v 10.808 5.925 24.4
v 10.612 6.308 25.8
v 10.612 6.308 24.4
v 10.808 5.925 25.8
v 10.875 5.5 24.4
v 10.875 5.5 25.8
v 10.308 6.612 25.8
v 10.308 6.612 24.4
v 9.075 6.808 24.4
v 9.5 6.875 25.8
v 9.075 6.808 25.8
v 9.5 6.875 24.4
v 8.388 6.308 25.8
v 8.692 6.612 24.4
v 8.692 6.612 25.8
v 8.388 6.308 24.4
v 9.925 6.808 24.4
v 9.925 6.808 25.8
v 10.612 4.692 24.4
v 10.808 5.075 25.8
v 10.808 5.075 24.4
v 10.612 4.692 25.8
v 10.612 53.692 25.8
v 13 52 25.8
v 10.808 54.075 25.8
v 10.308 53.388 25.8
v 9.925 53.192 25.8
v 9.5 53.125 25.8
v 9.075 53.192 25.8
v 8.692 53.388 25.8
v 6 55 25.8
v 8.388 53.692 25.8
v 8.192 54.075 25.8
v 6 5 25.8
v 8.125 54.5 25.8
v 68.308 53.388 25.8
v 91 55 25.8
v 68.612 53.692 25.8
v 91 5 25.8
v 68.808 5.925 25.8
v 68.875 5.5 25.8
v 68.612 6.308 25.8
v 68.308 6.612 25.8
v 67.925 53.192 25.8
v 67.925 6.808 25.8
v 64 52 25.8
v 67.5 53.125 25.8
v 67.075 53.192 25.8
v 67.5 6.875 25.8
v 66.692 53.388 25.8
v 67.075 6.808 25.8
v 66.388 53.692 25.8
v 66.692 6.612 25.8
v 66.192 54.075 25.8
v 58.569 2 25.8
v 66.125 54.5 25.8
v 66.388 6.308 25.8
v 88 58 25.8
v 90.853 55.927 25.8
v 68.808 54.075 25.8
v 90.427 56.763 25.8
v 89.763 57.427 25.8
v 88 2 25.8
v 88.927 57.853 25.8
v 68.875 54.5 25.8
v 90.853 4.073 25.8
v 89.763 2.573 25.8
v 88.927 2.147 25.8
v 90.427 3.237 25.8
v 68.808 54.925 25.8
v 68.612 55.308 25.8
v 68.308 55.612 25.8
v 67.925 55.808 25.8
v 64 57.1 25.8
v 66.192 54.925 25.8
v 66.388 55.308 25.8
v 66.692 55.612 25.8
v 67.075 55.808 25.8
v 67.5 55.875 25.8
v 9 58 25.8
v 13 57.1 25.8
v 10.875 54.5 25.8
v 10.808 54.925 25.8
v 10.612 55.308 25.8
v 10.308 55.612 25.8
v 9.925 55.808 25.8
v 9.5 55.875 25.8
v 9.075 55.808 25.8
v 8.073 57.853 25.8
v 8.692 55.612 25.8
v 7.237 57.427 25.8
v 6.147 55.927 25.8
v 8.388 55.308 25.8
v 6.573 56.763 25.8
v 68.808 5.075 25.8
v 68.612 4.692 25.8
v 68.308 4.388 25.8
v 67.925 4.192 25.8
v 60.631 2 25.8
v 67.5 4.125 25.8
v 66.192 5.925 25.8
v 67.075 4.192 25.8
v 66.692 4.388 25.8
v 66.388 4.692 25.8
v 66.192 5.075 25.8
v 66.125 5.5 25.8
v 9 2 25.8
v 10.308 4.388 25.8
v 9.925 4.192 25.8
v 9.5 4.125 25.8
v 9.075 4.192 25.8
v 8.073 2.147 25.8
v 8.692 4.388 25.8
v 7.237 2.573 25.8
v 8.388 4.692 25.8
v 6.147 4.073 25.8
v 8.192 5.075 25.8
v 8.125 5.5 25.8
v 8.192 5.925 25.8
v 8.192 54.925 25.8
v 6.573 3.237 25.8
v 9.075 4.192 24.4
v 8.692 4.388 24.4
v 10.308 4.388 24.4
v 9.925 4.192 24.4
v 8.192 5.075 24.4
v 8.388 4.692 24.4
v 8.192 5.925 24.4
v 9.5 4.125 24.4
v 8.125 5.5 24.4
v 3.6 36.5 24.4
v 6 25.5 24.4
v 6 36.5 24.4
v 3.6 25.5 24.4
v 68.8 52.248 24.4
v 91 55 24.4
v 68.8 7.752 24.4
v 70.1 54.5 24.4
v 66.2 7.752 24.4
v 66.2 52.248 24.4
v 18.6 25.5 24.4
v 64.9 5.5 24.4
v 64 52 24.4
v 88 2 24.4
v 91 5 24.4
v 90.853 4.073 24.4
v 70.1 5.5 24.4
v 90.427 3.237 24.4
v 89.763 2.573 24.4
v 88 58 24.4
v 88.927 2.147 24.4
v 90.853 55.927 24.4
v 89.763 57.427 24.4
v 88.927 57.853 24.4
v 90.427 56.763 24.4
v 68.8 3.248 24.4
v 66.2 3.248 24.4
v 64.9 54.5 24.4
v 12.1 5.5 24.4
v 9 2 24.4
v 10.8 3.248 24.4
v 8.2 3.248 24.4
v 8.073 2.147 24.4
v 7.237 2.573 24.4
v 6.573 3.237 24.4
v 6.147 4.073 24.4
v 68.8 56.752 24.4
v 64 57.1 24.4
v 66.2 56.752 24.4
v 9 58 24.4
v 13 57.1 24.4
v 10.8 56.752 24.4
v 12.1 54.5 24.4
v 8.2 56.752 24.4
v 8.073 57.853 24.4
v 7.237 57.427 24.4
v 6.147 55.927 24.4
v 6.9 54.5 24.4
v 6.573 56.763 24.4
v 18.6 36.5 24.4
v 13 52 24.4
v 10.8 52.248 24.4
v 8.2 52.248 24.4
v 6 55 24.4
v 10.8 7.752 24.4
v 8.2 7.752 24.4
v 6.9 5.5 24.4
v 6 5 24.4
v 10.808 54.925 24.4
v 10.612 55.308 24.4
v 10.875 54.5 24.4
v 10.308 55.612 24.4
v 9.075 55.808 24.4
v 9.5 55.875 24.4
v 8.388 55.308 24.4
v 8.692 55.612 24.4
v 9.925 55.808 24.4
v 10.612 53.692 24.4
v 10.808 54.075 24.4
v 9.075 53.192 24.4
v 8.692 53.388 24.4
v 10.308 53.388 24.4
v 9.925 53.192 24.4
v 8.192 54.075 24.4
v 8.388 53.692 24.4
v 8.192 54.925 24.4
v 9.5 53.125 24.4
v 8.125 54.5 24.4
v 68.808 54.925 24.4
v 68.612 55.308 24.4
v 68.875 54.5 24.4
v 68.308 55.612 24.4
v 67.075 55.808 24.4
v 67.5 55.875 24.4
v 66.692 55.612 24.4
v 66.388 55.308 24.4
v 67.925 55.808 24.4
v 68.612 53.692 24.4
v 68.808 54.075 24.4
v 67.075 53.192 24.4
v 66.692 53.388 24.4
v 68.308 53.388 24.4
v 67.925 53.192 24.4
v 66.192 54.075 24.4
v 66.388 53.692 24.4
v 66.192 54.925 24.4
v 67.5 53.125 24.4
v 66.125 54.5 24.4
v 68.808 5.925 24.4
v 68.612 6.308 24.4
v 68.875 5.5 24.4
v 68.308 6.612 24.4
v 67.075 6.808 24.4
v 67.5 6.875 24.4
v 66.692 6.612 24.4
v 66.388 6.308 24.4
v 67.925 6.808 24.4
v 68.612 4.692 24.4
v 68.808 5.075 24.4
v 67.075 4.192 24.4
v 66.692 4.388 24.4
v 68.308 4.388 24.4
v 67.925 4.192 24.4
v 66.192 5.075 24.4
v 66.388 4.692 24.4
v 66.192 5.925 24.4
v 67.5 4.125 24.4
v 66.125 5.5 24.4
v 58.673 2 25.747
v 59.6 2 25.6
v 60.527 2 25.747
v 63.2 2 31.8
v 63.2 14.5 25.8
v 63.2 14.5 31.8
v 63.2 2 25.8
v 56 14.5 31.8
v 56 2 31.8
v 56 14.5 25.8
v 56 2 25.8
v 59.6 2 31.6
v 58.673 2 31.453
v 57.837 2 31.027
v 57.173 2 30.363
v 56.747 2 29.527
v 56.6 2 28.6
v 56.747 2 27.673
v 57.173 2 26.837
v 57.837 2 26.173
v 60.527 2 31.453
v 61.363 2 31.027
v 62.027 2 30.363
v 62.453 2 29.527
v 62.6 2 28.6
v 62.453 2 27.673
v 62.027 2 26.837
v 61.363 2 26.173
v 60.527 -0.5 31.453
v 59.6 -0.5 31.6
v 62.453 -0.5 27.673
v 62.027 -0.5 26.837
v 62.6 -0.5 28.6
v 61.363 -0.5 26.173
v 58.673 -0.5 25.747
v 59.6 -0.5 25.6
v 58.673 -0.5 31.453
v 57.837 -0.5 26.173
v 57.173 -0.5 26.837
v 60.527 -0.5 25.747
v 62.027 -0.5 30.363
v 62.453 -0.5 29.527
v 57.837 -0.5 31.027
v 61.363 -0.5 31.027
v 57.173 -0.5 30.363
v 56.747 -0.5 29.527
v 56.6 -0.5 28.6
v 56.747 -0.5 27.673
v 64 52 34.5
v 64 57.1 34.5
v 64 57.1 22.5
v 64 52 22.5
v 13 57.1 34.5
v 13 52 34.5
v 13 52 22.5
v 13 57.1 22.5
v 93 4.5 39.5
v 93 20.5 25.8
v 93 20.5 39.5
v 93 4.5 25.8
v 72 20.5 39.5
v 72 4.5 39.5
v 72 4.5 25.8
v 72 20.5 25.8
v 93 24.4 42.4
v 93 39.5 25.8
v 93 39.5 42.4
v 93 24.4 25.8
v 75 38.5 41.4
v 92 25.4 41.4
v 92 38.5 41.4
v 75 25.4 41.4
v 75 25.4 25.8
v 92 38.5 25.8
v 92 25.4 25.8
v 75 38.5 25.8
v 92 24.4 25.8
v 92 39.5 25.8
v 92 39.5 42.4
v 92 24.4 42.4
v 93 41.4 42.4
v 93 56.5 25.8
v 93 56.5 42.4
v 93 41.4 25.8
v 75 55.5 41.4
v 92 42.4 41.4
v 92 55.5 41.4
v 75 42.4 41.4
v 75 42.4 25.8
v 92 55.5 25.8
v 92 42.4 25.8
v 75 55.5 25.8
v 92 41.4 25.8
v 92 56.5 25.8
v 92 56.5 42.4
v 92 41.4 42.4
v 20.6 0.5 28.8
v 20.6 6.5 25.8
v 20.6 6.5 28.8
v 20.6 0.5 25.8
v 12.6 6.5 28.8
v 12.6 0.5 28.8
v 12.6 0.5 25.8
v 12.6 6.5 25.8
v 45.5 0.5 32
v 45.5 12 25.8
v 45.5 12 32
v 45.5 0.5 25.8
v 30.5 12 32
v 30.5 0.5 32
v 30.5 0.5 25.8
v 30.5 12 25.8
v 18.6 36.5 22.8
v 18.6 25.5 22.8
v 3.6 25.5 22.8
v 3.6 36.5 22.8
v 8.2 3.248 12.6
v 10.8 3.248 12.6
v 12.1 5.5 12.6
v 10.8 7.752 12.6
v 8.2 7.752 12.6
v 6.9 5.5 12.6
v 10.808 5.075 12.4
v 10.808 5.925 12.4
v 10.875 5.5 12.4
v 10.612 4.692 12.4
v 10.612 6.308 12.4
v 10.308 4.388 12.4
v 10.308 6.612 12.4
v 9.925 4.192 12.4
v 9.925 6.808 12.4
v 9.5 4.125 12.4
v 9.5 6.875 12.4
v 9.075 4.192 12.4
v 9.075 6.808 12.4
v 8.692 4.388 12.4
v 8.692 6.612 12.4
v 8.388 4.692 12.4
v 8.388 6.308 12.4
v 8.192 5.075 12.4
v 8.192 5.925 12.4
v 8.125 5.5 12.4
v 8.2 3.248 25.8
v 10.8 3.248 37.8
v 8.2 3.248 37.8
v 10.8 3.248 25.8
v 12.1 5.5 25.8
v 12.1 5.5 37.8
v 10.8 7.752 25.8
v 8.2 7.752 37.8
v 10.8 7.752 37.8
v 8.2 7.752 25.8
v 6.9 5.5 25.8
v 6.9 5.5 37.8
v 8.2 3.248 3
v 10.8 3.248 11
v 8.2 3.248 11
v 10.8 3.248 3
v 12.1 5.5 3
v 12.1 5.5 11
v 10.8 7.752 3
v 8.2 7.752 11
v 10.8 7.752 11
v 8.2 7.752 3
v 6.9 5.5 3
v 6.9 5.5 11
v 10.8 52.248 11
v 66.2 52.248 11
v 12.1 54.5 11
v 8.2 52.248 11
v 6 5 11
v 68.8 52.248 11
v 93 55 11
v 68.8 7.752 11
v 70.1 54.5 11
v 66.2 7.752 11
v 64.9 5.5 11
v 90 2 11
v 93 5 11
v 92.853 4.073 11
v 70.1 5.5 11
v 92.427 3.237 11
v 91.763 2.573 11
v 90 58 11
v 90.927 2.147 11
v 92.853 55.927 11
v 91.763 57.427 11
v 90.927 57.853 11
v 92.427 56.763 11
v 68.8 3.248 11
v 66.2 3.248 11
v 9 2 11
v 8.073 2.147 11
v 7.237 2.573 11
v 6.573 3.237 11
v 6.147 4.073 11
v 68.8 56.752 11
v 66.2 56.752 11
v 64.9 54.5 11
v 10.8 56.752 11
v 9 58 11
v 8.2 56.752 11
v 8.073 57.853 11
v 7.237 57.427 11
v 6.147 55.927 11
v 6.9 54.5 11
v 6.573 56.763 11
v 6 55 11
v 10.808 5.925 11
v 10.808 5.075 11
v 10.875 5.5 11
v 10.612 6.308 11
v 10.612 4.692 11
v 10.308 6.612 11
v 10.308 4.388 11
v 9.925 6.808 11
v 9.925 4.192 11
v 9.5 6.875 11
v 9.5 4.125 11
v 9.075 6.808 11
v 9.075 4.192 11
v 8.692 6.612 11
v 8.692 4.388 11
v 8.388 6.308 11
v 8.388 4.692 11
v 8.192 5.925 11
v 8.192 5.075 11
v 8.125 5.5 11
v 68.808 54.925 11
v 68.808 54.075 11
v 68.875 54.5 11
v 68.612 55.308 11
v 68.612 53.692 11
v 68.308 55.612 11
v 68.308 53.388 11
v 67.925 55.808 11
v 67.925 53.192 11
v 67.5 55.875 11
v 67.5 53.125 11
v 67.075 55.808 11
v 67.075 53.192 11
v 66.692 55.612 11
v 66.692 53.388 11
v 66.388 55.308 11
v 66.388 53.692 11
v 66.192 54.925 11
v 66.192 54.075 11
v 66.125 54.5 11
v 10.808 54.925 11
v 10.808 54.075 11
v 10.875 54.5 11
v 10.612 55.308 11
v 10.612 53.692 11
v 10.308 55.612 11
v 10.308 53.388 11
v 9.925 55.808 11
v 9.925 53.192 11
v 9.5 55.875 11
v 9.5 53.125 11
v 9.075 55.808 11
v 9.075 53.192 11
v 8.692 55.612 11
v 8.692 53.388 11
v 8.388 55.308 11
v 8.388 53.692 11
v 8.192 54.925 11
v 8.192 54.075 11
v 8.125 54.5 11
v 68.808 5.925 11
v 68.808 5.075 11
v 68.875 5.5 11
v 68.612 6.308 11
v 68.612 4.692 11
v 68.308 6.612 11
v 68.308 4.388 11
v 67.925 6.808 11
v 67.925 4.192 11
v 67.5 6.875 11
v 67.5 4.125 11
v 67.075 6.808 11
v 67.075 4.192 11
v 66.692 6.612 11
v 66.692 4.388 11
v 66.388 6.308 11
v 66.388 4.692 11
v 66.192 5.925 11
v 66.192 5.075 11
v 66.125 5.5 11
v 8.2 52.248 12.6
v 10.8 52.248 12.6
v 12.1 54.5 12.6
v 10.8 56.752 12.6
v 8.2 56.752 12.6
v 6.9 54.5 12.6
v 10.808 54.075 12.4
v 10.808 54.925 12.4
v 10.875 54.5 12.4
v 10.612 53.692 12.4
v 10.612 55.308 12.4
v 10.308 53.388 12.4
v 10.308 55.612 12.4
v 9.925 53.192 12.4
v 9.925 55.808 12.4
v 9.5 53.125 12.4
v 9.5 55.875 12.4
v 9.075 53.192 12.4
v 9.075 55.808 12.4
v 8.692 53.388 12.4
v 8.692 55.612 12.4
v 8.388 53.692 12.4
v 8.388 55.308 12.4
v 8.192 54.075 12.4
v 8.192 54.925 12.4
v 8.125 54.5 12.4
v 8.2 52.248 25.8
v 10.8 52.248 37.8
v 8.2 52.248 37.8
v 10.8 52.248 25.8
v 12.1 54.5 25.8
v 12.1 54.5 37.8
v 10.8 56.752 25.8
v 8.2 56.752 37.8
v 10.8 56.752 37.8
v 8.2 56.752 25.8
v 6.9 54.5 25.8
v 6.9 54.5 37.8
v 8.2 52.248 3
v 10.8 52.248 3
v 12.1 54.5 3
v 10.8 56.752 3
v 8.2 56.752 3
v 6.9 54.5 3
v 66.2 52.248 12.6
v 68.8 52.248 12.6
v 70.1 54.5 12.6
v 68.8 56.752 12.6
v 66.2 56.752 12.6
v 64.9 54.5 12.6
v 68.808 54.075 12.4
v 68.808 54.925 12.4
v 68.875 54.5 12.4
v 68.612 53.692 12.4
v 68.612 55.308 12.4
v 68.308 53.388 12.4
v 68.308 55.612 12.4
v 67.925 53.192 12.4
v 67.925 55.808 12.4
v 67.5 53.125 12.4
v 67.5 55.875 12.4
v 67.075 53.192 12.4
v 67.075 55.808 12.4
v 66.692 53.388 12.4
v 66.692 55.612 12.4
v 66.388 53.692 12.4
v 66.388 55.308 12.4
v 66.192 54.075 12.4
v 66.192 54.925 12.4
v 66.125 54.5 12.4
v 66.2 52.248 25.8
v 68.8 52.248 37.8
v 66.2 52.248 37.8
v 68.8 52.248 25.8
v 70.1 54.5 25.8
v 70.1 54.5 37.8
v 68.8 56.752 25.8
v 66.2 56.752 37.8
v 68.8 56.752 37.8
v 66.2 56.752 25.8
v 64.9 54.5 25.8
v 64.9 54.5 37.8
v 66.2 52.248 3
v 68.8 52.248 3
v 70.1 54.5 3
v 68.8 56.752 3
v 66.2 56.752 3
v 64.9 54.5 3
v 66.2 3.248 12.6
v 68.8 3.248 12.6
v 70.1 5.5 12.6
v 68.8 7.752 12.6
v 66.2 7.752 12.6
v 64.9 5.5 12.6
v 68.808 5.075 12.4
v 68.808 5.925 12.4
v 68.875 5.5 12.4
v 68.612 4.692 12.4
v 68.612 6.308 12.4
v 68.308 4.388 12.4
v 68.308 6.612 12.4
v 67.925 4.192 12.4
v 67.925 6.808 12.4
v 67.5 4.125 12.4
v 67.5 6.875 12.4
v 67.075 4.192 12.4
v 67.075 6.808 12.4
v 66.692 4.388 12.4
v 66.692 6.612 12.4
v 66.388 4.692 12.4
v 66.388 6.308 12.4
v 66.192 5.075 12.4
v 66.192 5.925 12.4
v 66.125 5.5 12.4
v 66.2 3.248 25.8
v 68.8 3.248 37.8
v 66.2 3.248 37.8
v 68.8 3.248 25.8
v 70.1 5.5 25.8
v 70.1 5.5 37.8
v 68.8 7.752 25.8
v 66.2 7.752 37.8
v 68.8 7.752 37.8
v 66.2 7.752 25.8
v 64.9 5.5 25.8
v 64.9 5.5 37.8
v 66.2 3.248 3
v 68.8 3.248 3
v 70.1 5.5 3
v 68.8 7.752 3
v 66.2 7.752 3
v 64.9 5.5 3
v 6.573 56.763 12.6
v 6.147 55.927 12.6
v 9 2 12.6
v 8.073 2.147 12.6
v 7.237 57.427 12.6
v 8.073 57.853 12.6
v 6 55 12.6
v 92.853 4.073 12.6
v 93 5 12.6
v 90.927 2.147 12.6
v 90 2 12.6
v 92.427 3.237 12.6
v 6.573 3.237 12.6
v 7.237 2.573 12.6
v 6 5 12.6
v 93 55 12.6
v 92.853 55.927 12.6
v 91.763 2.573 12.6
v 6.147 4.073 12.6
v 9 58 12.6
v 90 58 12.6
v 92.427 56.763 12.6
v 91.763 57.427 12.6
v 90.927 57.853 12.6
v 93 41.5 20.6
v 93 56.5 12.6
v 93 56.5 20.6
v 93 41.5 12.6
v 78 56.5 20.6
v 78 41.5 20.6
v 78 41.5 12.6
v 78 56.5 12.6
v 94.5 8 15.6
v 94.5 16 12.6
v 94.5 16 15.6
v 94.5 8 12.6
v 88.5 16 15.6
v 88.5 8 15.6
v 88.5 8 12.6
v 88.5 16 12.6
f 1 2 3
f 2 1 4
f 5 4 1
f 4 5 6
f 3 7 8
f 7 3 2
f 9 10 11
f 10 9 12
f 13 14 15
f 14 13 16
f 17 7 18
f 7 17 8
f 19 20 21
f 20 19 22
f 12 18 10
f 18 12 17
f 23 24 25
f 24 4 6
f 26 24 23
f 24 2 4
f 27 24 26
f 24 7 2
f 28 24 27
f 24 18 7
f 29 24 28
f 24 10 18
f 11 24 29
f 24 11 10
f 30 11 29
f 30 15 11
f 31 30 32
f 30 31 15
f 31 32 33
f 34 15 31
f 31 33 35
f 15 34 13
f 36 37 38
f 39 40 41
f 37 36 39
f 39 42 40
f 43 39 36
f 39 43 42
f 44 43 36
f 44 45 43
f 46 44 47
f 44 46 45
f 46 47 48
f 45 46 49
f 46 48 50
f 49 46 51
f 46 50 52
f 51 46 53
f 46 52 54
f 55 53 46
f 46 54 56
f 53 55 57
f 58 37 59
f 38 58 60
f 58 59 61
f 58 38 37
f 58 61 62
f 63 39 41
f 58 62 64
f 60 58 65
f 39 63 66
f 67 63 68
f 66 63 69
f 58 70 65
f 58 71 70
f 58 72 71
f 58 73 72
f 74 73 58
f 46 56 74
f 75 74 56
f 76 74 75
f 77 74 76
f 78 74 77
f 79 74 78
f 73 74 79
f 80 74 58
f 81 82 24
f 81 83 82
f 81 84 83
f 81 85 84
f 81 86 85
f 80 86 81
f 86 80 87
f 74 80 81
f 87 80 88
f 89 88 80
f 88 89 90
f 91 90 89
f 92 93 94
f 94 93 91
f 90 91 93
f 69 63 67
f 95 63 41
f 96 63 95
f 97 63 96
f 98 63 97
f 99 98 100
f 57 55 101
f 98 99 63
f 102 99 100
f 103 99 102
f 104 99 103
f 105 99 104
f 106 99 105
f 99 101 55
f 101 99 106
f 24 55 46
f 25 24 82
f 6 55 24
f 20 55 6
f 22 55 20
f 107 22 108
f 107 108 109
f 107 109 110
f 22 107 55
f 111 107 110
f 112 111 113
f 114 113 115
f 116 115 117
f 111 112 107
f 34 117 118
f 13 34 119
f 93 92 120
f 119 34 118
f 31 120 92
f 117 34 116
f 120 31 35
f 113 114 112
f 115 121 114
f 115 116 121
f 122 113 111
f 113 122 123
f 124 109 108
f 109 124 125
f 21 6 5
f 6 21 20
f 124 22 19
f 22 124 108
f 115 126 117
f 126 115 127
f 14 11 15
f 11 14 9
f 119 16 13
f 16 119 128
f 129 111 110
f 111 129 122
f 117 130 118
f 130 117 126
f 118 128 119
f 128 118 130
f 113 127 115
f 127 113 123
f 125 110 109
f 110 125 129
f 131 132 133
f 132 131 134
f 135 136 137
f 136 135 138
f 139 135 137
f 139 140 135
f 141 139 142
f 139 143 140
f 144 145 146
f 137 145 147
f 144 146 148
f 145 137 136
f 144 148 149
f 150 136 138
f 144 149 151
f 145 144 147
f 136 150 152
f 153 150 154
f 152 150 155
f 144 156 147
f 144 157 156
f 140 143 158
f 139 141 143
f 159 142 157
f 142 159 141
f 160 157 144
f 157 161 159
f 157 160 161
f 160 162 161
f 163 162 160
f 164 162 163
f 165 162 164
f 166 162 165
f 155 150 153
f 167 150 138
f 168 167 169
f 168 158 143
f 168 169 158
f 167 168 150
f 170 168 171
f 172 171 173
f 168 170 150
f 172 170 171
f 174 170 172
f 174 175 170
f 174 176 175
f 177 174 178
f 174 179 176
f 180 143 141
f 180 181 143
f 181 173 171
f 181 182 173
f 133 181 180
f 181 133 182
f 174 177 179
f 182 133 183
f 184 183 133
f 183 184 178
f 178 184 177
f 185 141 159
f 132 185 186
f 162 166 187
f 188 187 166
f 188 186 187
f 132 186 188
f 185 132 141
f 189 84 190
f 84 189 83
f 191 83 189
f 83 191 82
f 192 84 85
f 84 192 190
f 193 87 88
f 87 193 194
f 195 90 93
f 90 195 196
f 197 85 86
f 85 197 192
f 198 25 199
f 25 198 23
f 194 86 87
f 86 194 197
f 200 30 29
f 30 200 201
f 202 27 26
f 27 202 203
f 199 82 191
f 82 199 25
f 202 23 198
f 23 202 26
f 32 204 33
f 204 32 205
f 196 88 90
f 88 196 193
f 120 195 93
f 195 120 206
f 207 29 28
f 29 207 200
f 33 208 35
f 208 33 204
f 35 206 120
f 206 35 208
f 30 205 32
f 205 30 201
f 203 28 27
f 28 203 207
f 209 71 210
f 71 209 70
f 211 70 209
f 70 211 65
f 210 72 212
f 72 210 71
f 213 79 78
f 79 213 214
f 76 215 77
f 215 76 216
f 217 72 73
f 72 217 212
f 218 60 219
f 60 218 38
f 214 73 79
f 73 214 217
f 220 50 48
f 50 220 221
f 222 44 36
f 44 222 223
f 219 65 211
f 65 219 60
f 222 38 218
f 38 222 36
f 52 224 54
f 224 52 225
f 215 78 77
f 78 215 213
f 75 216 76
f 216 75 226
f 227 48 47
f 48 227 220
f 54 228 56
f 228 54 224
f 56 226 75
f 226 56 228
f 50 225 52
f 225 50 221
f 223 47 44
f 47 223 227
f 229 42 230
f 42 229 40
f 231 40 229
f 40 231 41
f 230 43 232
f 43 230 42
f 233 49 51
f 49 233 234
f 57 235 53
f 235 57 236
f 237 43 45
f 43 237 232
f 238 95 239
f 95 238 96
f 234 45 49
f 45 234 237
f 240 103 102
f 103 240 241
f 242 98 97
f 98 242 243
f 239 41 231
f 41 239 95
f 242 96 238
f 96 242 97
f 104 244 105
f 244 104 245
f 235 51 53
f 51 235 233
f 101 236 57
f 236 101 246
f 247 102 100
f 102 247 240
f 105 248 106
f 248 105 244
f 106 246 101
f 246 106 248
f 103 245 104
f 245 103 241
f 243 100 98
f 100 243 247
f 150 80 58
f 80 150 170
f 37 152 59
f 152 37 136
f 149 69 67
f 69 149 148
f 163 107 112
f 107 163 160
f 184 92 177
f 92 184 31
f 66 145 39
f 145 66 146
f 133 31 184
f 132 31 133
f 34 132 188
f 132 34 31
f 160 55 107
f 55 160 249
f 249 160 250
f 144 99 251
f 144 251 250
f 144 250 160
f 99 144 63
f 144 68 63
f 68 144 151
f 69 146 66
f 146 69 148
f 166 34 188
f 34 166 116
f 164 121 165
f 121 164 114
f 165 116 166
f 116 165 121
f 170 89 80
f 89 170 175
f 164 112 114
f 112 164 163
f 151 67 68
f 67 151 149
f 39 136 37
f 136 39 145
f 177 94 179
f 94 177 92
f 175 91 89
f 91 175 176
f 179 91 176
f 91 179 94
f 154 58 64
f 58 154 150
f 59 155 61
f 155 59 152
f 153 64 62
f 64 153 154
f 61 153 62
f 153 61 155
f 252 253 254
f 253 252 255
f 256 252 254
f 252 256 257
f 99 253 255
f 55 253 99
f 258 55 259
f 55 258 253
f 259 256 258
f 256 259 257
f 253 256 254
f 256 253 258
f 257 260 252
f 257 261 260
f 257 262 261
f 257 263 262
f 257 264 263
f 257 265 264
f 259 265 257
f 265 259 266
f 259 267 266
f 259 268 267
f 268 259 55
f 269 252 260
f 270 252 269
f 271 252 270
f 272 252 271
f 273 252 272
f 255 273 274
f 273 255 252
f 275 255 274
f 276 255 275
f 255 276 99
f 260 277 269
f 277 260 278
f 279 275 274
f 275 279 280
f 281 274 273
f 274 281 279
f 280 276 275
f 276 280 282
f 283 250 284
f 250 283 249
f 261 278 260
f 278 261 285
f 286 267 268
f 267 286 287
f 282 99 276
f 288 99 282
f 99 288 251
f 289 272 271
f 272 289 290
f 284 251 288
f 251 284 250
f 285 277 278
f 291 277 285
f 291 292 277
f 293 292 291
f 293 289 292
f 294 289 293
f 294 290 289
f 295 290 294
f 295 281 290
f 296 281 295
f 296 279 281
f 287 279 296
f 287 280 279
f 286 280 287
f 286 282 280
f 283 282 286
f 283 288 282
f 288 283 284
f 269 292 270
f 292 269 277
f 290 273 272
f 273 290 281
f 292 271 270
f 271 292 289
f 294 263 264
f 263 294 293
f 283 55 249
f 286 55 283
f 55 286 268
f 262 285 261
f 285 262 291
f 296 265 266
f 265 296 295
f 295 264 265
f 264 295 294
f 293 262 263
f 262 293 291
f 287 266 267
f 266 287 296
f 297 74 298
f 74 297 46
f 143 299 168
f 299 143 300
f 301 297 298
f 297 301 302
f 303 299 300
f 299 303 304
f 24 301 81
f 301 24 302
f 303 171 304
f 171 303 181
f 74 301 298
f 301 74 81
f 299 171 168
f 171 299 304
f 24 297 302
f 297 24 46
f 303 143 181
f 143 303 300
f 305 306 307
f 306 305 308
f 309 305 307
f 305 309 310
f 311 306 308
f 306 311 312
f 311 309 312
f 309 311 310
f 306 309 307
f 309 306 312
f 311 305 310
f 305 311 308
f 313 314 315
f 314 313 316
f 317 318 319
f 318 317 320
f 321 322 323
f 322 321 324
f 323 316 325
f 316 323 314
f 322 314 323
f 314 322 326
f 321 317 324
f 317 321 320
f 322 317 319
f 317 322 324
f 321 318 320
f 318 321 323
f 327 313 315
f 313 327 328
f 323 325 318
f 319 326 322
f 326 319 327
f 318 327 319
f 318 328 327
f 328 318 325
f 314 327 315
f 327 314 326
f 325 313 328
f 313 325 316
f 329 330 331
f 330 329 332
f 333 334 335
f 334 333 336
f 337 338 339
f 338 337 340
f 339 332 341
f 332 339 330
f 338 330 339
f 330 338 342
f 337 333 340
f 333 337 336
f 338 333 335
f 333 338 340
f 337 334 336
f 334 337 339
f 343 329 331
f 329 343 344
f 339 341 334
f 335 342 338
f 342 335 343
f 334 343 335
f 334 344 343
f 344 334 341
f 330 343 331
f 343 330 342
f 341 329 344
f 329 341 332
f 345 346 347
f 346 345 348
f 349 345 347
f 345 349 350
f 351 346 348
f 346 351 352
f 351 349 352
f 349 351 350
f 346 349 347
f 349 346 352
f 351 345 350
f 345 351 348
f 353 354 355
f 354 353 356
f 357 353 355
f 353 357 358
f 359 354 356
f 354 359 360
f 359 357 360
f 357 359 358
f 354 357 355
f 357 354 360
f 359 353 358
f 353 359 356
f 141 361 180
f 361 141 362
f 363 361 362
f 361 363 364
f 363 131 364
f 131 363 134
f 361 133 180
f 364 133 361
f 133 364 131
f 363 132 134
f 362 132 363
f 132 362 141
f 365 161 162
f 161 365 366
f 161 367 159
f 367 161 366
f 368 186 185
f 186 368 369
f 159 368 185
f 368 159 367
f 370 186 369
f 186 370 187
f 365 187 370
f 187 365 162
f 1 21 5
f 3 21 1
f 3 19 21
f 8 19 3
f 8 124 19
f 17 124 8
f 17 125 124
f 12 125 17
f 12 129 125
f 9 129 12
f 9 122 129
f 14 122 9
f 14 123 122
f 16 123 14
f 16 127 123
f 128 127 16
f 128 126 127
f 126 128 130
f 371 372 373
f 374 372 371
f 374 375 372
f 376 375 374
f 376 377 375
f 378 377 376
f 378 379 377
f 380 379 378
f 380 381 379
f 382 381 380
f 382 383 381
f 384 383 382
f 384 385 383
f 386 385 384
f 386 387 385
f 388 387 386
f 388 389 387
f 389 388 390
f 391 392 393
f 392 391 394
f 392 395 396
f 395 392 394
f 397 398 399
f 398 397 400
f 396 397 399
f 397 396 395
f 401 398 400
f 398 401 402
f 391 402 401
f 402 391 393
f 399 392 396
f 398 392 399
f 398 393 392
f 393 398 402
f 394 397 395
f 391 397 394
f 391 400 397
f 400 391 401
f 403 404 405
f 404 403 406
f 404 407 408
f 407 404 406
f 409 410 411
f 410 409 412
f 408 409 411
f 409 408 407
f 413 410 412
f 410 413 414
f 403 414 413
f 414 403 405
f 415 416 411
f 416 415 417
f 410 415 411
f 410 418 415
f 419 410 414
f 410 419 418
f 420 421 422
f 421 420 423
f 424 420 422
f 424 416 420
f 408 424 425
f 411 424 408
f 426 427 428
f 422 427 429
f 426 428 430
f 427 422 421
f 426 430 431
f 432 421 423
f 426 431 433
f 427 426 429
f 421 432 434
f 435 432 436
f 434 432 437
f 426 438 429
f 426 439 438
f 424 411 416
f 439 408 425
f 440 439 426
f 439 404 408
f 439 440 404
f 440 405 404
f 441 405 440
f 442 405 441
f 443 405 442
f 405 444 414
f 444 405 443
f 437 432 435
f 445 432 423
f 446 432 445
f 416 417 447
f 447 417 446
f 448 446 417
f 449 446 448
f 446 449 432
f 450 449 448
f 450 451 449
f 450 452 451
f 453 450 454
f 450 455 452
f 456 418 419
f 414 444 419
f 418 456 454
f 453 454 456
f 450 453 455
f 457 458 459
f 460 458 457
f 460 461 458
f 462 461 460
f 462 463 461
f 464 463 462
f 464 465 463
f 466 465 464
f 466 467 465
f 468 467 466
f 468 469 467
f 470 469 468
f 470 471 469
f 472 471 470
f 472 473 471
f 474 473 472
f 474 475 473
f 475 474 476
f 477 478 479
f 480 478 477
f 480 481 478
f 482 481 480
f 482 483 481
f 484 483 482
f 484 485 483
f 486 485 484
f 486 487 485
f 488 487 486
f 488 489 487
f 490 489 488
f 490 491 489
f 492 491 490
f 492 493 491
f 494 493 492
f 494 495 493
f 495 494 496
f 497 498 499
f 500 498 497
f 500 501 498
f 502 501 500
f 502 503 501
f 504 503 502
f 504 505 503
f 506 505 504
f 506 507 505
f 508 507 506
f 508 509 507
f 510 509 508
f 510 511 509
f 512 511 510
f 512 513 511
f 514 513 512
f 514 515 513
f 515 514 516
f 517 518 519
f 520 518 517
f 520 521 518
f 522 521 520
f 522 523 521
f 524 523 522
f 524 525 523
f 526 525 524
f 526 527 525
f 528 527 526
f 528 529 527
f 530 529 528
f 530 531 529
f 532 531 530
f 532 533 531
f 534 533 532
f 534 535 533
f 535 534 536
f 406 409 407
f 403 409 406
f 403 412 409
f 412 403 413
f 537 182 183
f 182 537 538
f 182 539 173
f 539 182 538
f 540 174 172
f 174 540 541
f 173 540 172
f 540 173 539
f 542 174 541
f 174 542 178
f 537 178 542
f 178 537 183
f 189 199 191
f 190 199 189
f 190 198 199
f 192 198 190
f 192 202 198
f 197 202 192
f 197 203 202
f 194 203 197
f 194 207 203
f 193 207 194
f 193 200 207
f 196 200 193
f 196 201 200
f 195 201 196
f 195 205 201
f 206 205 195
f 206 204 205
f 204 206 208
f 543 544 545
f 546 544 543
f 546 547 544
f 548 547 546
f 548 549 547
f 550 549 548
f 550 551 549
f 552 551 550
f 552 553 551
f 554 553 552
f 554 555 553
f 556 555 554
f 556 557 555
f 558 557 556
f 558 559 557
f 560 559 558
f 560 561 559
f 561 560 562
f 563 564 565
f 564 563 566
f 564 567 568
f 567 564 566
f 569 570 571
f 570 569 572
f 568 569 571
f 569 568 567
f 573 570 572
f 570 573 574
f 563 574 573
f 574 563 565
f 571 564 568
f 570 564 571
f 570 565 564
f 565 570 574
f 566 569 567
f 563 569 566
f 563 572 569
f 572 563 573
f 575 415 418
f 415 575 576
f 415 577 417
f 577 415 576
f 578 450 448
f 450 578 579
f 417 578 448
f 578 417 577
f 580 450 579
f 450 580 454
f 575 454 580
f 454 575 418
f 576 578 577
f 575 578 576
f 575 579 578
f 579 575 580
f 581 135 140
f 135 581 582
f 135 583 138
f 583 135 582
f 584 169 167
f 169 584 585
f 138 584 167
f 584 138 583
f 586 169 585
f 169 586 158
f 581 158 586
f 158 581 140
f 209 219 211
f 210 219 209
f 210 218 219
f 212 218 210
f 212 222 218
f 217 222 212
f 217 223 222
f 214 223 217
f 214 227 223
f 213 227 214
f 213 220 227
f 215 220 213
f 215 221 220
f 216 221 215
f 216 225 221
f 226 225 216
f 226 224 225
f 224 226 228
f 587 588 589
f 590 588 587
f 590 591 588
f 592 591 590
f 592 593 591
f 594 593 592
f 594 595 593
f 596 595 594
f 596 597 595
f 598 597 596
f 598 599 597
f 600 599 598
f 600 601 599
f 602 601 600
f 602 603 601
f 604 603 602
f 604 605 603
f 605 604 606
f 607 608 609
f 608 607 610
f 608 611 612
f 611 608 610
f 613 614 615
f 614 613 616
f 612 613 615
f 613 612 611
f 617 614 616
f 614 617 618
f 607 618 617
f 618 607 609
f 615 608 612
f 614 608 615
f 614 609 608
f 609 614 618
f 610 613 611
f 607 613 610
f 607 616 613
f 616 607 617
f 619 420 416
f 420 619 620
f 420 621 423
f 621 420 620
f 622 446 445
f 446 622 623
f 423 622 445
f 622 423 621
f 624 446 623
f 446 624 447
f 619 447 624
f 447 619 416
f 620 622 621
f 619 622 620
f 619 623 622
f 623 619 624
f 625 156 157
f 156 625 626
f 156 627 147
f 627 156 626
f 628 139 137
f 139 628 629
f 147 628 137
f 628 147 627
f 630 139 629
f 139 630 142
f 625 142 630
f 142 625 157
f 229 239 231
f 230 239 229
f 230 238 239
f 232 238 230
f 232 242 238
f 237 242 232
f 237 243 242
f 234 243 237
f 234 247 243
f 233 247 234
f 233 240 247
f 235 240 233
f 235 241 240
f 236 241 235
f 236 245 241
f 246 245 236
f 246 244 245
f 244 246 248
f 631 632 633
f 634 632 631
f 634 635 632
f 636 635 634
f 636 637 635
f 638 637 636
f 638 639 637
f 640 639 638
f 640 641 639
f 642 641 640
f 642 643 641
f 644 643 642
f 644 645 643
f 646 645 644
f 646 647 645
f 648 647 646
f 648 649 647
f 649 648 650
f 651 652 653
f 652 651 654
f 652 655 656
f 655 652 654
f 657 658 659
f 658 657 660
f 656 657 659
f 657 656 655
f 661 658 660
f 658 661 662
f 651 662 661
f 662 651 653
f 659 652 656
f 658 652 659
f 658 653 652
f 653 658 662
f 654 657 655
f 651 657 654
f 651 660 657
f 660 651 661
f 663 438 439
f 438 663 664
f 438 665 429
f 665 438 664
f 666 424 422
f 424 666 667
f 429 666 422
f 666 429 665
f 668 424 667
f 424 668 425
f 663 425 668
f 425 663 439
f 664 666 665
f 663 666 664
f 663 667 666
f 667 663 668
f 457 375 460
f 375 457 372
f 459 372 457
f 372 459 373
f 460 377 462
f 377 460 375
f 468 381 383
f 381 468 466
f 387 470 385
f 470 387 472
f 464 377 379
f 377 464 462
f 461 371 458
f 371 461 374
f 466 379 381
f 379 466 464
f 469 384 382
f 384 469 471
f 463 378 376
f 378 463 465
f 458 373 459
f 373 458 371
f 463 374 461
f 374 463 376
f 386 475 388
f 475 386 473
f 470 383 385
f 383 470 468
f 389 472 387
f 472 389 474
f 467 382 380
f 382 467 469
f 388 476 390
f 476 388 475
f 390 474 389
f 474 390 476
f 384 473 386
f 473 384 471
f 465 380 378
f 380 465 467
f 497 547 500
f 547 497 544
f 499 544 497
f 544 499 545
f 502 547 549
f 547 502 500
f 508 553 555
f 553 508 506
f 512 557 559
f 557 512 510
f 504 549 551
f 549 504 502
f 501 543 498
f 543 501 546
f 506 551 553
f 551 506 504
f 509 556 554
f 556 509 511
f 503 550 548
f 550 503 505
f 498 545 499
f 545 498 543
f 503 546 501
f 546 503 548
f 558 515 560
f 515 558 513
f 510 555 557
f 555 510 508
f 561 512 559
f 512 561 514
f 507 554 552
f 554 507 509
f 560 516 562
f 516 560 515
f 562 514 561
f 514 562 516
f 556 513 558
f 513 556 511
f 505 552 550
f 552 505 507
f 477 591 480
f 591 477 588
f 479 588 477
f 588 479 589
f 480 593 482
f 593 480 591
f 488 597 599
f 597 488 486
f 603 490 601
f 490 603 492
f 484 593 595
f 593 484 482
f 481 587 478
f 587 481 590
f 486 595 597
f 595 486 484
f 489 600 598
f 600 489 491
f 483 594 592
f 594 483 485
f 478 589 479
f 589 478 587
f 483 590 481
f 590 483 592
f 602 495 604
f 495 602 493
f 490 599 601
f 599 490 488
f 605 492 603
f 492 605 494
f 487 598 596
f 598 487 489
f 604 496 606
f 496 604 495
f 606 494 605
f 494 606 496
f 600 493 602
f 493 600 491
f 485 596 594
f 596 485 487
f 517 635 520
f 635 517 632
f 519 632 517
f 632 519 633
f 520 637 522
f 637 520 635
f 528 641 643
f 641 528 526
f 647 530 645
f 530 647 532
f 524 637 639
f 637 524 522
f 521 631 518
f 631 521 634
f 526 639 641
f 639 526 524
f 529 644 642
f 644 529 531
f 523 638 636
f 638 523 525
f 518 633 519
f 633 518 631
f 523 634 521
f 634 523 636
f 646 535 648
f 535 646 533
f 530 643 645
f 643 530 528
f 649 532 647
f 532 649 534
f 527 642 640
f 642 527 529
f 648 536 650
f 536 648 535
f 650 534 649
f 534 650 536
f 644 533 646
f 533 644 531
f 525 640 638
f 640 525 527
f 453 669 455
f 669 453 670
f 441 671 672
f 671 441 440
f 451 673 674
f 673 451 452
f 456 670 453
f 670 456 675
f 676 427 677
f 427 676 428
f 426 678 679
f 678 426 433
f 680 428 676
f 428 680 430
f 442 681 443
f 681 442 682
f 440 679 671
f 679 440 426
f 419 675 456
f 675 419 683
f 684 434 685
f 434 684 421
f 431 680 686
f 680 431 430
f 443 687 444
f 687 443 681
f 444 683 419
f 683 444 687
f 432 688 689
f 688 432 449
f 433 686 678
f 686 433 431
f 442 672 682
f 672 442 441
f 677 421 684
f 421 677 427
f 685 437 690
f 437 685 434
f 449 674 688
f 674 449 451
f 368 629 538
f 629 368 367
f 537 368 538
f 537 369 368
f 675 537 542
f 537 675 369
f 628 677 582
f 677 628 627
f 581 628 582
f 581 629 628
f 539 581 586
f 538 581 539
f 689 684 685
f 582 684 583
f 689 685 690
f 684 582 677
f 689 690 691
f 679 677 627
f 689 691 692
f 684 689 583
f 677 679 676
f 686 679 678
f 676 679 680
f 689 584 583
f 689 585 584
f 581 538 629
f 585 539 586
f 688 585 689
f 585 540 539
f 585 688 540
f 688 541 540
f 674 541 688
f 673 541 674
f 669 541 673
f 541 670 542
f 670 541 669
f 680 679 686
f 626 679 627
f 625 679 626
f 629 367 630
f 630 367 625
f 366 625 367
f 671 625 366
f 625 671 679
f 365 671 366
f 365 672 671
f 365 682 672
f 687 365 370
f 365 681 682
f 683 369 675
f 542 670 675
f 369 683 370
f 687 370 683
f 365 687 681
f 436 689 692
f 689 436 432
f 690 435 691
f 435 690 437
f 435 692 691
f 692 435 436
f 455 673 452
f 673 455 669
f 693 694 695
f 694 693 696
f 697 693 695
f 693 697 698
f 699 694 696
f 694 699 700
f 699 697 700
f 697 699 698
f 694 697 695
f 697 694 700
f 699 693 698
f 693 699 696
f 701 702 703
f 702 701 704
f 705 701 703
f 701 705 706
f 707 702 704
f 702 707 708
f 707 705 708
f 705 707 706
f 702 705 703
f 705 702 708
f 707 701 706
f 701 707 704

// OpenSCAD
// file: x860.scad
$fn = 20;

board_x=87;
board_y=56;
board_z=1.6;
board_r=3;
board_hole_d=2.75;
board_holes=[
  [3.5, 3.5],
  [3.5, 52.5],
  [61.5, 52.5],
  [61.5, 3.5]
];

x860();

module x860()
{
  color("green") difference()
  {
    translate([board_r, board_r, 0])
    minkowski()
    {
      cube([board_x - board_r*2, board_y-board_r*2, board_z/2]);
      cylinder(r=board_r, h=board_z/2);
    }
    
    for(hole = board_holes) {
      translate(hole)
      cylinder(d=board_hole_d, h=board_z);
    };
  }
  
  // usb
  translate([board_x - 15, 39.5, board_z]) 
  cube([15, 15, 8]);
  
  // micro usb
  translate([board_x - 4.5, 6, board_z]) 
  cube([6, 8, 3]);  
}
// file: raspberrypi.scad
$fn = 20;

board_x=85;
board_y=56;
board_z=1.4;
board_r=3;
board_hole_d=2.75;
board_holes=[
  [ 3.5,  3.5  ],
  [ 3.5,  52.5 ],
  [ 61.5, 52.5 ],
  [ 61.5, 3.5  ]
];

pi3();

module pi3()
{
  color("green") 
  difference()
  {
    translate([board_r, board_r, 0])
    minkowski()
    {
      cube([board_x - board_r*2, board_y - board_r*2, board_z/2]);
      cylinder(r=board_r, h=board_z/2);
    }

    for(hole = board_holes) {
      translate(hole)
      cylinder(d=board_hole_d, h=board_z);
    };
  }

  translate([0, 0, board_z])
  {
    // header
    translate([7, board_y - 6, -3.3])
    cube([51, 5.1, 12]);

    // eth
    translate([66, 2.5, 0])
    cube([21, 16, 13.7]);

    // usb1
    translate([69, 23.4, 0])
    cube([18, 13.1, 15.6]);
    translate([86, 22.4, 0])
    cube([1, 15.1, 16.6]);
    
    // usb2
    translate([69, 40.4, 0])
    cube([18, 13.1, 15.6]);
    translate([86, 39.4, 0])
    cube([1, 15.1, 16.6]);
    
    // micro usb
    translate([6.6, -1.5, 0])
    cube([8, 6, 3]);

    // hdmi
    translate([24.5, -1.5, 0])
    cube([15, 11.5, 6.2]);

    // jack
    translate([50, -2.5, 0])
    {
      translate([0, 2.5, 0])
      cube([7.2, 12.5, 6]);

      translate([3.6, 0, 2.8])
      rotate([-90, 0, 0]) cylinder(d=6, h=2.5);
    }
  }

  // microSD card
  translate([-2.4, 23.5, -1.6])
  cube([15, 11, 1.6]);
}
// main file
use <raspberrypi.scad>
use <x860.scad>

print=false;
open=false;
device=true;
part="";

if(print) {
  if(part=="bottom")
  bottom();

  if(part=="top")
  rotate([180, 0, 180])
  top();
}
else
{
  if(open) {
    bottom();
    translate([0, 0, enclosure_thickness_xy * 2])
    translate([10 + 2 * outer_x, 0, inner_z])
    rotate([180, 0, 180])
    top();
  }
  else
  {
    %bottom();
    %top();
  }

  if(device) {
    translate([enclosure_thickness_xy + tolerance_device_x, enclosure_thickness_xy, hole_depth + tolerance_z])
    _pi_hdd();
  }
}

enclosure_thickness_xy = 2;
enclosure_thickness_z = 3;
ventilate = true;
vent_hole_d = 2;

hole_tolerance = 0.2;
spacer_d = 5 + hole_tolerance;
spacer_bottom_z = 8;
spacer_middle_z = 12;
spacer_top_z = 12;

screw_diameter = 2.46 + hole_tolerance;
screw_head_height = 1.7;
screw_head_diameter = 4.8 + hole_tolerance;

hole_depth = max(3, enclosure_thickness_z);

tolerance_z = 0;
tolerance_device_y = 4;
tolerance_device_x = 4;
tolerance_top = 0.3;

board_z=1.4;

device_x=88;
device_y=56;
device_z= spacer_bottom_z + board_z + spacer_middle_z + board_z + spacer_top_z;

inner_x=device_x + tolerance_device_x;
inner_y=device_y + tolerance_device_y;
inner_z=device_z + 2 * tolerance_z + 2*(hole_depth-enclosure_thickness_z);

outer_x=inner_x + 2 * enclosure_thickness_xy;
outer_y=inner_y + 2 * enclosure_thickness_xy;
outer_z=inner_z + 2 * enclosure_thickness_z;

$eps = 1/80;
$fn=20;

board_holes=[
  [ 3.5,  3.5  ],
  [ 3.5,  52.5 ],
  [ 61.5, 52.5 ],
  [ 61.5, 3.5  ]
];

vent_holes=5;
vent_hole_padding_x=(52.5 - 3.5) / 6;
vent_hole_padding_y=(61.5 - 3.5) / 6;

vent_hole_distance_y=(52.5 - 3.5 - 2 * vent_hole_padding_y) / (vent_holes);
vent_hole_distance_x=(61.5 - 3.5 - 2 * vent_hole_padding_x) / (vent_holes);

module top()
  difference() {
    translate([0, 0, outer_z])
    mirror([0, 0, 1])
    _plate(top=true);

    translate([tolerance_device_x, 0, hole_depth])
    _holes();
  }

module bottom()
  difference() {
    union() {
      _plate();

      translate([0, 0, enclosure_thickness_z])
      _box(inner_z);
    }

    translate([tolerance_device_x, 0, hole_depth + tolerance_z])
    _holes();
  }

module _ventilation_holes() {
  
  translate([3.5 + vent_hole_padding_x, 3.5 + vent_hole_padding_y, 0])
  {
    for(i = [0:vent_holes]) {
      hull() {
        translate([i * vent_hole_distance_x, 0, 0])
        cylinder(h=enclosure_thickness_z*2, d=vent_hole_d);
        
        translate([0, i * vent_hole_distance_y, 0])
        cylinder(h=enclosure_thickness_z*2, d=vent_hole_d);
      }
    }
    
    for(i = [1:vent_holes]) {
      hull() {
        translate([i * vent_hole_distance_x, vent_holes * vent_hole_distance_y, 0])
        cylinder(h=enclosure_thickness_z*2, d=vent_hole_d);
        
        translate([vent_holes * vent_hole_distance_x, i * vent_hole_distance_y, 0])
        cylinder(h=enclosure_thickness_z*2, d=vent_hole_d);
      }
    }
  }
}

module _plate(top=false)
  difference() {
    union() {
      _cube_round([outer_x, outer_y, enclosure_thickness_z], enclosure_thickness_xy*2);

      translate([enclosure_thickness_xy + tolerance_device_x, enclosure_thickness_xy, 0])
      for(hole = board_holes) {
        translate(hole)
        cylinder(h=hole_depth, d=spacer_d);
      };

      if(top){
        translate([enclosure_thickness_xy + tolerance_top, enclosure_thickness_xy + tolerance_top, enclosure_thickness_z])
        _cube_round([inner_x - tolerance_top * 2, inner_y - tolerance_top * 2, enclosure_thickness_z/3], enclosure_thickness_xy);
      }
    }

    translate([enclosure_thickness_xy + tolerance_device_x, enclosure_thickness_xy, 0])
    {
      for(hole = board_holes) {
        translate(hole)
        translate([0, 0, hole_depth])
        cylinder(h=hole_depth, d=spacer_d);

        translate(hole)
        cylinder(h=hole_depth, d=screw_diameter);

        translate(hole)
        cylinder(h=screw_head_height, d1=screw_head_diameter, d2=screw_diameter);
      };

      if(top && ventilate) {
        _ventilation_holes();
      }
    }
  };

module _box(height)
  difference() {
    _cube_round([outer_x, outer_y, height], enclosure_thickness_xy * 2);

    translate([enclosure_thickness_xy, enclosure_thickness_xy, -$eps])
    _cube_round([inner_x, inner_y, height + 2 * $eps], enclosure_thickness_xy);
  };


eth_hole_width = 17;
eth_hole_height = 15;
eth_hole_depth = 25.5;

usb_hole_width = 14;
usb_hole_height = 17;
usb_hole_depth = 22.5;

usb_hdd_hole_height = 8;

micro_usb_hole_width = 10;
micro_usb_hole_height = 4;

sd_hole_width = 18;
sd_hole_height = 5;

hdmi_hole_width = 16;
hdmi_hole_height = 8;

audio_hole_d = 7;

module _holes()
  union() {
    // pi
    translate([0, 0, spacer_bottom_z + board_z + spacer_middle_z + board_z]) {
      // Ethernet
      translate([device_x - eth_hole_depth + 5, 12.5 - eth_hole_width/2, 7 - eth_hole_height/2])
      cube([eth_hole_depth + 5, eth_hole_width, eth_hole_height]);

      // USB
      translate([device_x - usb_hole_depth + 5, 31.9 - usb_hole_width/2, 8 - usb_hole_height/2])
      cube([usb_hole_depth + 5, usb_hole_width, usb_hole_height]);
      translate([device_x, 31.9 - usb_hole_width/2 - 1, 8 - usb_hole_height/2])
      cube([1, usb_hole_width + 2, usb_hole_height + 1]);

      translate([device_x - usb_hole_depth + 5, 48.9 - usb_hole_width/2, 8 - usb_hole_height/2])
      cube([usb_hole_depth + 5, usb_hole_width, usb_hole_height]);
      translate([device_x, 48.9 - usb_hole_width/2 - 1, 8 - usb_hole_height/2])
      cube([1, usb_hole_width + 2, usb_hole_height + 1]);
      
      // micro USB
      translate([12.5 - micro_usb_hole_width/2, -4, 1.5 - micro_usb_hole_height/2])
      cube([micro_usb_hole_width, 10, micro_usb_hole_height]);

      // HDMI
      translate([34 - hdmi_hole_width/2, -6, 3.5- hdmi_hole_height/2])
      cube([hdmi_hole_width, 13, hdmi_hole_height]);

      // Audio
      translate([55.5, 0, -0.5 + audio_hole_d/2])
      rotate([-90,0,0]) cylinder(d=audio_hole_d, h=5);

      // Micro SD Card
      translate([-10, 31 - sd_hole_width/2, -2 - sd_hole_height/2])
      cube([20, sd_hole_width, sd_hole_height]);
    }

    // hdd
    translate([0, 0, spacer_bottom_z + board_z]) {
      // USB
      translate([device_x - enclosure_thickness_xy, 48.9 - usb_hole_width/2, 4 - usb_hdd_hole_height/2])
      cube([10, usb_hole_width, usb_hdd_hole_height]);

      // micro USB
      translate([device_x - enclosure_thickness_xy, 12 - micro_usb_hole_width/2, 2 - micro_usb_hole_height/2])
      cube([10, micro_usb_hole_width, micro_usb_hole_height]);
    }
  }

module _cube_round(size, r)
  translate([r, r, 0])
  minkowski() {
    cube([
      size[0] - 2*r,
      size[1] - 2*r,
      size[2] - 0.1
    ]);
    cylinder(h=0.1, r=r);
  }

module _pi_hdd() {
  union()
  {
    translate([0, 0, spacer_bottom_z + board_z + spacer_middle_z]      )
    pi3();

    // spacers
    for(hole = board_holes) {
      translate(hole)
      {
        cylinder(d=spacer_d, h=spacer_bottom_z, $fn=6);

        translate([0, 0, spacer_bottom_z + board_z])
        {
          cylinder(d=spacer_d, h=spacer_middle_z, $fn=6);

          translate([0, 0, spacer_middle_z + board_z])
          cylinder(d=spacer_d, h=spacer_top_z, $fn=6);
        }
      }
    };

    translate([0, 0, spacer_bottom_z])
    x860();
  }
}
